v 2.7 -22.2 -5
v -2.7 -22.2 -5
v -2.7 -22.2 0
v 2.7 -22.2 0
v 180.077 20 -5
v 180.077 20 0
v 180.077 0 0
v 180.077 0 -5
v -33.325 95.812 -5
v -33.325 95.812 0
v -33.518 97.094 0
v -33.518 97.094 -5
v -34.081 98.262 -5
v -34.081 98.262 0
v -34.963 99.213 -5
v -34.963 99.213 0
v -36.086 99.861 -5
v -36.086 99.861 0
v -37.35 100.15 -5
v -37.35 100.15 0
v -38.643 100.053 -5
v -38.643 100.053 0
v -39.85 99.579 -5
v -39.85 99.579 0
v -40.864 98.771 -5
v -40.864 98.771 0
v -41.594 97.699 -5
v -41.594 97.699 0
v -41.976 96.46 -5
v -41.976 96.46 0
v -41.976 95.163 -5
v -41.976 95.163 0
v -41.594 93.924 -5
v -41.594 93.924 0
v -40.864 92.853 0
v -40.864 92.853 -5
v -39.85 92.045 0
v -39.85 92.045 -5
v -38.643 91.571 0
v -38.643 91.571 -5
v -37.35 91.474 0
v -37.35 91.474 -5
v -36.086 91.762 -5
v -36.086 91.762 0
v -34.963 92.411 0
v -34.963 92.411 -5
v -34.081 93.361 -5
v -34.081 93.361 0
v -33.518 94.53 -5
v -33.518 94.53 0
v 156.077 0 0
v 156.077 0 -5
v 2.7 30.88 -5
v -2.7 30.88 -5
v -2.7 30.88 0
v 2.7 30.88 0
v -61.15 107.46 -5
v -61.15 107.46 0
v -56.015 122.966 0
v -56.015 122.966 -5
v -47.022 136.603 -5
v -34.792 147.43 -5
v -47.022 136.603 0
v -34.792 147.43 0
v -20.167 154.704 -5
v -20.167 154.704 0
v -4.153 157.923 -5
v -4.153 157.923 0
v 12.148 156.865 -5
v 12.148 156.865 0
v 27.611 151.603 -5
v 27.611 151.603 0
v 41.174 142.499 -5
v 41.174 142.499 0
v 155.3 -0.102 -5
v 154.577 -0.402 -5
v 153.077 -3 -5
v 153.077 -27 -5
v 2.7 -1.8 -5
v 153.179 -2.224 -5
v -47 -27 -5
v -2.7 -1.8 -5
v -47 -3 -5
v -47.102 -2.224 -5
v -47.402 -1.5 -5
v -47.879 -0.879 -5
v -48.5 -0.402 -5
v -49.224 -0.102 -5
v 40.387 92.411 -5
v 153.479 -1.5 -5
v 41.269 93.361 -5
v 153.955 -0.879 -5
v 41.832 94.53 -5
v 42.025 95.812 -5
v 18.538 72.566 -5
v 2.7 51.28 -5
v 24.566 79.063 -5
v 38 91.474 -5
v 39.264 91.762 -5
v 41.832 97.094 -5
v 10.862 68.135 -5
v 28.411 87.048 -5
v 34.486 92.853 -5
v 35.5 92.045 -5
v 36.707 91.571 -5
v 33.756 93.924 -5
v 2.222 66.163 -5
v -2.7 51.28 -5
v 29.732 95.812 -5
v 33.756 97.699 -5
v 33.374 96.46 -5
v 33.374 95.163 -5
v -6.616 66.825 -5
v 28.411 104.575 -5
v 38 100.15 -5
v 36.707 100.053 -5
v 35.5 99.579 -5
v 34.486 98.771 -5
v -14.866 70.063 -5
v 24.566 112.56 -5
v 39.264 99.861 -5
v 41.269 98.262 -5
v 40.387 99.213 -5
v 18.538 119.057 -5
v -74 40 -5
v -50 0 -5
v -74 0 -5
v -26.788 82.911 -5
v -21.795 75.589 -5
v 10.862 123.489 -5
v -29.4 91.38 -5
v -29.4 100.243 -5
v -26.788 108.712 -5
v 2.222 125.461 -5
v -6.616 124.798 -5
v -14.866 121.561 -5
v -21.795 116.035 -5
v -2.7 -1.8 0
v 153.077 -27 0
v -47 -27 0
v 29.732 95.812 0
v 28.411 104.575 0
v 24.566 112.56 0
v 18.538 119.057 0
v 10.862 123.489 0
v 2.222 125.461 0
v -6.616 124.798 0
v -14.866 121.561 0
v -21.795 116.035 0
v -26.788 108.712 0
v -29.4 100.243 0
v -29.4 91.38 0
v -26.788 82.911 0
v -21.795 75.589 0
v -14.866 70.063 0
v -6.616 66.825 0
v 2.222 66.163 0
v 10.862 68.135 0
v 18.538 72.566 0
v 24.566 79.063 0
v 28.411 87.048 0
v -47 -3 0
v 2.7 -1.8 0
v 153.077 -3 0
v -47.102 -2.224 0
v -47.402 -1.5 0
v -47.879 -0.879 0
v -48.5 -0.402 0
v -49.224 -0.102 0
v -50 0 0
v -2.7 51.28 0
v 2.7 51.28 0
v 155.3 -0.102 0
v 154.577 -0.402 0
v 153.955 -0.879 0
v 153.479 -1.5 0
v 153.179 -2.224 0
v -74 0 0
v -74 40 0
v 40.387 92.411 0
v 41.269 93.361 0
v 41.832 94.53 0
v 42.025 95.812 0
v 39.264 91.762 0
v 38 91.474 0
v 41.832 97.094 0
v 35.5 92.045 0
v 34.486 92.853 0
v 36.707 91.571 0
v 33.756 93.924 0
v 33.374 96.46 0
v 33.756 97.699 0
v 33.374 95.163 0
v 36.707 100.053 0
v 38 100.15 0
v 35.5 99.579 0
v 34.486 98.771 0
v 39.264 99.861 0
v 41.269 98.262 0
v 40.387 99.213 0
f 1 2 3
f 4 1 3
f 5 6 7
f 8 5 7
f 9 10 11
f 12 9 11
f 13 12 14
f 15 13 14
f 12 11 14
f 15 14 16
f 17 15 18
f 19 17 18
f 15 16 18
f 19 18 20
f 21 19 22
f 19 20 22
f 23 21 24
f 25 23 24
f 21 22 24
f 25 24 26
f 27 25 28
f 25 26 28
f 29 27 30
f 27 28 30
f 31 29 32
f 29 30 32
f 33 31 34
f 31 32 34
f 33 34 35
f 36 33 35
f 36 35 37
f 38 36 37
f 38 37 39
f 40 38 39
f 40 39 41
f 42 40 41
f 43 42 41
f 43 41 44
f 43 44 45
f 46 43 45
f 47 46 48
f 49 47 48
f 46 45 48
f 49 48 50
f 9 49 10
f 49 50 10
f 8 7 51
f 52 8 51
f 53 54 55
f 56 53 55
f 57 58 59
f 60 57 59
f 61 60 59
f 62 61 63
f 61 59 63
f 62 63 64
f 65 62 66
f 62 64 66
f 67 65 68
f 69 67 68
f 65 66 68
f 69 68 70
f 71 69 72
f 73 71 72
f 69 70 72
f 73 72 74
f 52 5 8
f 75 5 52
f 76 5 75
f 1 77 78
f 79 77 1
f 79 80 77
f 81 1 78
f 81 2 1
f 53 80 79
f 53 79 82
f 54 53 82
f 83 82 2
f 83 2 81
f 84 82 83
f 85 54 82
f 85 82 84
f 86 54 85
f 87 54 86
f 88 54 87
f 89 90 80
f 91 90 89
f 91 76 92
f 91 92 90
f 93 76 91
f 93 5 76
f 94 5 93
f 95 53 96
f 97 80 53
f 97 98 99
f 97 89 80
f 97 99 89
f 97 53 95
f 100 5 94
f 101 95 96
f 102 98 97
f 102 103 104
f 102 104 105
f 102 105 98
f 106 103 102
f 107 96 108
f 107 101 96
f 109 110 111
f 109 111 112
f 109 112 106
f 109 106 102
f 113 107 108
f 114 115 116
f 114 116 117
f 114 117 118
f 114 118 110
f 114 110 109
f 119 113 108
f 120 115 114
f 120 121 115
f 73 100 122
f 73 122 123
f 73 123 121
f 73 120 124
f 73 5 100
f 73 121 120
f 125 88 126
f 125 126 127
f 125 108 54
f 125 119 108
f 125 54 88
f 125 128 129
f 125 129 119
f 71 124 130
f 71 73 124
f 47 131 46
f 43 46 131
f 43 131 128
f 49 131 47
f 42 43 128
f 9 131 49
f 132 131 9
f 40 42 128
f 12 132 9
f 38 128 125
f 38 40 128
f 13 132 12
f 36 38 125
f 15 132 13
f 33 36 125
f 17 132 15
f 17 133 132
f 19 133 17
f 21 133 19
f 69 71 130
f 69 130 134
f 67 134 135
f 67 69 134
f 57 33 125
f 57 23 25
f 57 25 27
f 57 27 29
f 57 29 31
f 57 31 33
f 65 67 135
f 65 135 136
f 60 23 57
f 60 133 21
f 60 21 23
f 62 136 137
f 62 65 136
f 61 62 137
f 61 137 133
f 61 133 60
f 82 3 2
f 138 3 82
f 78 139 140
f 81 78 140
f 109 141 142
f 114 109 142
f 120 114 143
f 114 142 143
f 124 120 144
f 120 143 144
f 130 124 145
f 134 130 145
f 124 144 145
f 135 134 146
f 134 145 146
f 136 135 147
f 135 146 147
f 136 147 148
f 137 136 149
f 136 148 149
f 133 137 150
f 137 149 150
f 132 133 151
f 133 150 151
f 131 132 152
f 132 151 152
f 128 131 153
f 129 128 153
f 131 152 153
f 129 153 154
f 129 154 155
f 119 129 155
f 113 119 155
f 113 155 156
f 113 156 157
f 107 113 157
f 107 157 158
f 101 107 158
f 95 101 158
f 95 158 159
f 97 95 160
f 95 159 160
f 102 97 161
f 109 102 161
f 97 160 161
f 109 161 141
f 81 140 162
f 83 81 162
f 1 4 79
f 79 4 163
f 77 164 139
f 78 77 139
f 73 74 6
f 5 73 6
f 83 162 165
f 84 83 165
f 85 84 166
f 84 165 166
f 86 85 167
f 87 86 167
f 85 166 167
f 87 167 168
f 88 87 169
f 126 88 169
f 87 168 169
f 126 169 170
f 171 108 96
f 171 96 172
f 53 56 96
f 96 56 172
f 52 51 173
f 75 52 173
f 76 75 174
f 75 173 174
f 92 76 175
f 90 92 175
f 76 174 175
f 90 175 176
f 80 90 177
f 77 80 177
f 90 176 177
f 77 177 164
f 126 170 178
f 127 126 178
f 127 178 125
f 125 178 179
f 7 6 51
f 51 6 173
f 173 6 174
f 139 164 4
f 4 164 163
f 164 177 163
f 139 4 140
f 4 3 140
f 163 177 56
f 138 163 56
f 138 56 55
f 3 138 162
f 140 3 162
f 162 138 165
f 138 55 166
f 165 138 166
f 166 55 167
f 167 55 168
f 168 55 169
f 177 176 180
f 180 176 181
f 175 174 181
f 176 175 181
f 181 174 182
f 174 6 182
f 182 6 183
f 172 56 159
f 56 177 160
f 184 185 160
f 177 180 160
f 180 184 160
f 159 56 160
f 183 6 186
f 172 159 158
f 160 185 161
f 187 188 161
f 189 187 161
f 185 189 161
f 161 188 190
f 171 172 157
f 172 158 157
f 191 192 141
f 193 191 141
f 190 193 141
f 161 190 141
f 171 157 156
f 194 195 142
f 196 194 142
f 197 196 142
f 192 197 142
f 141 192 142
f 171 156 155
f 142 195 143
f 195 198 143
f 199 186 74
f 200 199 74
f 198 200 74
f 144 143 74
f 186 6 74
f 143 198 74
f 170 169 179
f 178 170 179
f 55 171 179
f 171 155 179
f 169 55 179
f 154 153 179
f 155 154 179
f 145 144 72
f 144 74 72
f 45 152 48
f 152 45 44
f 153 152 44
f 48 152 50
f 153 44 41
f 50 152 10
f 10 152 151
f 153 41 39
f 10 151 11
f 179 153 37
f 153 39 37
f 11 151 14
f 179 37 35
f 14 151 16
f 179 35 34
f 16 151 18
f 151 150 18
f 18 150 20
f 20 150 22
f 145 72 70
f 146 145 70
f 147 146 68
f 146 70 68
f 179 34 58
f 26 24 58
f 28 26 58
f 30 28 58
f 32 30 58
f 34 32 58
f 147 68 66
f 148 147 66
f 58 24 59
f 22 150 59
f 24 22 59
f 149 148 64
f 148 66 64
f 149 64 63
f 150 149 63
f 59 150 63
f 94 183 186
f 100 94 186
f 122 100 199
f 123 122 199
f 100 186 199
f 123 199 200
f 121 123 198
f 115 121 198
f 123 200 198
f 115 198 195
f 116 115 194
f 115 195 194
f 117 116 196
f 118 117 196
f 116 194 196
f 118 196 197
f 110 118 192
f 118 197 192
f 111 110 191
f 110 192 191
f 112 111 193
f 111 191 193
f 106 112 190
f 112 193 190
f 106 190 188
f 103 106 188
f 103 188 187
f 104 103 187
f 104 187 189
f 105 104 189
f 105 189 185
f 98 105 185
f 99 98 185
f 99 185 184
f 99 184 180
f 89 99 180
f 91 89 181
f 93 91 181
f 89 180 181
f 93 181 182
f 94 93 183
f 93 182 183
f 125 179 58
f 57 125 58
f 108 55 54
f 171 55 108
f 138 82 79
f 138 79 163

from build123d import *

# Parameters (mm, degrees)
SKETCH_1_R             = 4.35
SKETCH_1_R_2           = 29.732137495
SM_BASE_FLANGE_1_DEPTH = 5
OTHER_START            = -2.7
OTHER_1_OUTLINE_W      = 20.4
OTHER_1_OUTLINE_H      = 5
OTHER_1_DEPTH          = 5.4


# Read off the part's stored shape, not the designer's step: Выступы и прорези-Прорезь1
# Sheet-metal steps are written as plain solids
with BuildPart() as part:
    # Sketch 1 → Базовая кромка1 (new body)
    with BuildSketch(Plane.XY):
        with BuildLine():
            Line((153.076706029, -3), (153.076706029, -27))
            Line((153.076706029, -27), (-47, -27))
            Line((-47, -27), (-47, -3))
            ThreePointArc((-47, -3), (-47.878679656, -0.878679656), (-50, 0))
            Line((-50, 0), (-74, 0))
            Line((-74, 0), (-74, 40))
            Line((-74, 40), (-61.150039911, 107.459829597))
            ThreePointArc((-61.150039911, 107.459829597), (-20.166822902, 154.704084341), (41.173899677, 142.499190395))
            Line((41.173899677, 142.499190395), (180.076706029, 20))
            Line((180.076706029, 20), (180.076706029, 0))
            Line((180.076706029, 0), (156.076706029, 0))
            ThreePointArc((156.076706029, 0), (153.955385686, -0.878679656), (153.076706029, -3))
        make_face()
        with Locations((-37.675, 95.811778053)):
            Circle(SKETCH_1_R, mode=Mode.SUBTRACT)
        with Locations((37.675, 95.811778053)):
            Circle(SKETCH_1_R, mode=Mode.SUBTRACT)
        with Locations((0, 95.811778053)):
            Circle(SKETCH_1_R_2, mode=Mode.SUBTRACT)
    extrude(amount=-SM_BASE_FLANGE_1_DEPTH)

    # Other 1 outline → Other 1 (cut)
    with BuildSketch(Plane.YZ.offset(OTHER_START)):
        with Locations((41.079640558, -2.5)):
            Rectangle(OTHER_1_OUTLINE_W, OTHER_1_OUTLINE_H)
        with Locations((-12, -2.5)):
            Rectangle(OTHER_1_OUTLINE_W, OTHER_1_OUTLINE_H)
    extrude(amount=OTHER_1_DEPTH, mode=Mode.SUBTRACT)


solid = part.part
